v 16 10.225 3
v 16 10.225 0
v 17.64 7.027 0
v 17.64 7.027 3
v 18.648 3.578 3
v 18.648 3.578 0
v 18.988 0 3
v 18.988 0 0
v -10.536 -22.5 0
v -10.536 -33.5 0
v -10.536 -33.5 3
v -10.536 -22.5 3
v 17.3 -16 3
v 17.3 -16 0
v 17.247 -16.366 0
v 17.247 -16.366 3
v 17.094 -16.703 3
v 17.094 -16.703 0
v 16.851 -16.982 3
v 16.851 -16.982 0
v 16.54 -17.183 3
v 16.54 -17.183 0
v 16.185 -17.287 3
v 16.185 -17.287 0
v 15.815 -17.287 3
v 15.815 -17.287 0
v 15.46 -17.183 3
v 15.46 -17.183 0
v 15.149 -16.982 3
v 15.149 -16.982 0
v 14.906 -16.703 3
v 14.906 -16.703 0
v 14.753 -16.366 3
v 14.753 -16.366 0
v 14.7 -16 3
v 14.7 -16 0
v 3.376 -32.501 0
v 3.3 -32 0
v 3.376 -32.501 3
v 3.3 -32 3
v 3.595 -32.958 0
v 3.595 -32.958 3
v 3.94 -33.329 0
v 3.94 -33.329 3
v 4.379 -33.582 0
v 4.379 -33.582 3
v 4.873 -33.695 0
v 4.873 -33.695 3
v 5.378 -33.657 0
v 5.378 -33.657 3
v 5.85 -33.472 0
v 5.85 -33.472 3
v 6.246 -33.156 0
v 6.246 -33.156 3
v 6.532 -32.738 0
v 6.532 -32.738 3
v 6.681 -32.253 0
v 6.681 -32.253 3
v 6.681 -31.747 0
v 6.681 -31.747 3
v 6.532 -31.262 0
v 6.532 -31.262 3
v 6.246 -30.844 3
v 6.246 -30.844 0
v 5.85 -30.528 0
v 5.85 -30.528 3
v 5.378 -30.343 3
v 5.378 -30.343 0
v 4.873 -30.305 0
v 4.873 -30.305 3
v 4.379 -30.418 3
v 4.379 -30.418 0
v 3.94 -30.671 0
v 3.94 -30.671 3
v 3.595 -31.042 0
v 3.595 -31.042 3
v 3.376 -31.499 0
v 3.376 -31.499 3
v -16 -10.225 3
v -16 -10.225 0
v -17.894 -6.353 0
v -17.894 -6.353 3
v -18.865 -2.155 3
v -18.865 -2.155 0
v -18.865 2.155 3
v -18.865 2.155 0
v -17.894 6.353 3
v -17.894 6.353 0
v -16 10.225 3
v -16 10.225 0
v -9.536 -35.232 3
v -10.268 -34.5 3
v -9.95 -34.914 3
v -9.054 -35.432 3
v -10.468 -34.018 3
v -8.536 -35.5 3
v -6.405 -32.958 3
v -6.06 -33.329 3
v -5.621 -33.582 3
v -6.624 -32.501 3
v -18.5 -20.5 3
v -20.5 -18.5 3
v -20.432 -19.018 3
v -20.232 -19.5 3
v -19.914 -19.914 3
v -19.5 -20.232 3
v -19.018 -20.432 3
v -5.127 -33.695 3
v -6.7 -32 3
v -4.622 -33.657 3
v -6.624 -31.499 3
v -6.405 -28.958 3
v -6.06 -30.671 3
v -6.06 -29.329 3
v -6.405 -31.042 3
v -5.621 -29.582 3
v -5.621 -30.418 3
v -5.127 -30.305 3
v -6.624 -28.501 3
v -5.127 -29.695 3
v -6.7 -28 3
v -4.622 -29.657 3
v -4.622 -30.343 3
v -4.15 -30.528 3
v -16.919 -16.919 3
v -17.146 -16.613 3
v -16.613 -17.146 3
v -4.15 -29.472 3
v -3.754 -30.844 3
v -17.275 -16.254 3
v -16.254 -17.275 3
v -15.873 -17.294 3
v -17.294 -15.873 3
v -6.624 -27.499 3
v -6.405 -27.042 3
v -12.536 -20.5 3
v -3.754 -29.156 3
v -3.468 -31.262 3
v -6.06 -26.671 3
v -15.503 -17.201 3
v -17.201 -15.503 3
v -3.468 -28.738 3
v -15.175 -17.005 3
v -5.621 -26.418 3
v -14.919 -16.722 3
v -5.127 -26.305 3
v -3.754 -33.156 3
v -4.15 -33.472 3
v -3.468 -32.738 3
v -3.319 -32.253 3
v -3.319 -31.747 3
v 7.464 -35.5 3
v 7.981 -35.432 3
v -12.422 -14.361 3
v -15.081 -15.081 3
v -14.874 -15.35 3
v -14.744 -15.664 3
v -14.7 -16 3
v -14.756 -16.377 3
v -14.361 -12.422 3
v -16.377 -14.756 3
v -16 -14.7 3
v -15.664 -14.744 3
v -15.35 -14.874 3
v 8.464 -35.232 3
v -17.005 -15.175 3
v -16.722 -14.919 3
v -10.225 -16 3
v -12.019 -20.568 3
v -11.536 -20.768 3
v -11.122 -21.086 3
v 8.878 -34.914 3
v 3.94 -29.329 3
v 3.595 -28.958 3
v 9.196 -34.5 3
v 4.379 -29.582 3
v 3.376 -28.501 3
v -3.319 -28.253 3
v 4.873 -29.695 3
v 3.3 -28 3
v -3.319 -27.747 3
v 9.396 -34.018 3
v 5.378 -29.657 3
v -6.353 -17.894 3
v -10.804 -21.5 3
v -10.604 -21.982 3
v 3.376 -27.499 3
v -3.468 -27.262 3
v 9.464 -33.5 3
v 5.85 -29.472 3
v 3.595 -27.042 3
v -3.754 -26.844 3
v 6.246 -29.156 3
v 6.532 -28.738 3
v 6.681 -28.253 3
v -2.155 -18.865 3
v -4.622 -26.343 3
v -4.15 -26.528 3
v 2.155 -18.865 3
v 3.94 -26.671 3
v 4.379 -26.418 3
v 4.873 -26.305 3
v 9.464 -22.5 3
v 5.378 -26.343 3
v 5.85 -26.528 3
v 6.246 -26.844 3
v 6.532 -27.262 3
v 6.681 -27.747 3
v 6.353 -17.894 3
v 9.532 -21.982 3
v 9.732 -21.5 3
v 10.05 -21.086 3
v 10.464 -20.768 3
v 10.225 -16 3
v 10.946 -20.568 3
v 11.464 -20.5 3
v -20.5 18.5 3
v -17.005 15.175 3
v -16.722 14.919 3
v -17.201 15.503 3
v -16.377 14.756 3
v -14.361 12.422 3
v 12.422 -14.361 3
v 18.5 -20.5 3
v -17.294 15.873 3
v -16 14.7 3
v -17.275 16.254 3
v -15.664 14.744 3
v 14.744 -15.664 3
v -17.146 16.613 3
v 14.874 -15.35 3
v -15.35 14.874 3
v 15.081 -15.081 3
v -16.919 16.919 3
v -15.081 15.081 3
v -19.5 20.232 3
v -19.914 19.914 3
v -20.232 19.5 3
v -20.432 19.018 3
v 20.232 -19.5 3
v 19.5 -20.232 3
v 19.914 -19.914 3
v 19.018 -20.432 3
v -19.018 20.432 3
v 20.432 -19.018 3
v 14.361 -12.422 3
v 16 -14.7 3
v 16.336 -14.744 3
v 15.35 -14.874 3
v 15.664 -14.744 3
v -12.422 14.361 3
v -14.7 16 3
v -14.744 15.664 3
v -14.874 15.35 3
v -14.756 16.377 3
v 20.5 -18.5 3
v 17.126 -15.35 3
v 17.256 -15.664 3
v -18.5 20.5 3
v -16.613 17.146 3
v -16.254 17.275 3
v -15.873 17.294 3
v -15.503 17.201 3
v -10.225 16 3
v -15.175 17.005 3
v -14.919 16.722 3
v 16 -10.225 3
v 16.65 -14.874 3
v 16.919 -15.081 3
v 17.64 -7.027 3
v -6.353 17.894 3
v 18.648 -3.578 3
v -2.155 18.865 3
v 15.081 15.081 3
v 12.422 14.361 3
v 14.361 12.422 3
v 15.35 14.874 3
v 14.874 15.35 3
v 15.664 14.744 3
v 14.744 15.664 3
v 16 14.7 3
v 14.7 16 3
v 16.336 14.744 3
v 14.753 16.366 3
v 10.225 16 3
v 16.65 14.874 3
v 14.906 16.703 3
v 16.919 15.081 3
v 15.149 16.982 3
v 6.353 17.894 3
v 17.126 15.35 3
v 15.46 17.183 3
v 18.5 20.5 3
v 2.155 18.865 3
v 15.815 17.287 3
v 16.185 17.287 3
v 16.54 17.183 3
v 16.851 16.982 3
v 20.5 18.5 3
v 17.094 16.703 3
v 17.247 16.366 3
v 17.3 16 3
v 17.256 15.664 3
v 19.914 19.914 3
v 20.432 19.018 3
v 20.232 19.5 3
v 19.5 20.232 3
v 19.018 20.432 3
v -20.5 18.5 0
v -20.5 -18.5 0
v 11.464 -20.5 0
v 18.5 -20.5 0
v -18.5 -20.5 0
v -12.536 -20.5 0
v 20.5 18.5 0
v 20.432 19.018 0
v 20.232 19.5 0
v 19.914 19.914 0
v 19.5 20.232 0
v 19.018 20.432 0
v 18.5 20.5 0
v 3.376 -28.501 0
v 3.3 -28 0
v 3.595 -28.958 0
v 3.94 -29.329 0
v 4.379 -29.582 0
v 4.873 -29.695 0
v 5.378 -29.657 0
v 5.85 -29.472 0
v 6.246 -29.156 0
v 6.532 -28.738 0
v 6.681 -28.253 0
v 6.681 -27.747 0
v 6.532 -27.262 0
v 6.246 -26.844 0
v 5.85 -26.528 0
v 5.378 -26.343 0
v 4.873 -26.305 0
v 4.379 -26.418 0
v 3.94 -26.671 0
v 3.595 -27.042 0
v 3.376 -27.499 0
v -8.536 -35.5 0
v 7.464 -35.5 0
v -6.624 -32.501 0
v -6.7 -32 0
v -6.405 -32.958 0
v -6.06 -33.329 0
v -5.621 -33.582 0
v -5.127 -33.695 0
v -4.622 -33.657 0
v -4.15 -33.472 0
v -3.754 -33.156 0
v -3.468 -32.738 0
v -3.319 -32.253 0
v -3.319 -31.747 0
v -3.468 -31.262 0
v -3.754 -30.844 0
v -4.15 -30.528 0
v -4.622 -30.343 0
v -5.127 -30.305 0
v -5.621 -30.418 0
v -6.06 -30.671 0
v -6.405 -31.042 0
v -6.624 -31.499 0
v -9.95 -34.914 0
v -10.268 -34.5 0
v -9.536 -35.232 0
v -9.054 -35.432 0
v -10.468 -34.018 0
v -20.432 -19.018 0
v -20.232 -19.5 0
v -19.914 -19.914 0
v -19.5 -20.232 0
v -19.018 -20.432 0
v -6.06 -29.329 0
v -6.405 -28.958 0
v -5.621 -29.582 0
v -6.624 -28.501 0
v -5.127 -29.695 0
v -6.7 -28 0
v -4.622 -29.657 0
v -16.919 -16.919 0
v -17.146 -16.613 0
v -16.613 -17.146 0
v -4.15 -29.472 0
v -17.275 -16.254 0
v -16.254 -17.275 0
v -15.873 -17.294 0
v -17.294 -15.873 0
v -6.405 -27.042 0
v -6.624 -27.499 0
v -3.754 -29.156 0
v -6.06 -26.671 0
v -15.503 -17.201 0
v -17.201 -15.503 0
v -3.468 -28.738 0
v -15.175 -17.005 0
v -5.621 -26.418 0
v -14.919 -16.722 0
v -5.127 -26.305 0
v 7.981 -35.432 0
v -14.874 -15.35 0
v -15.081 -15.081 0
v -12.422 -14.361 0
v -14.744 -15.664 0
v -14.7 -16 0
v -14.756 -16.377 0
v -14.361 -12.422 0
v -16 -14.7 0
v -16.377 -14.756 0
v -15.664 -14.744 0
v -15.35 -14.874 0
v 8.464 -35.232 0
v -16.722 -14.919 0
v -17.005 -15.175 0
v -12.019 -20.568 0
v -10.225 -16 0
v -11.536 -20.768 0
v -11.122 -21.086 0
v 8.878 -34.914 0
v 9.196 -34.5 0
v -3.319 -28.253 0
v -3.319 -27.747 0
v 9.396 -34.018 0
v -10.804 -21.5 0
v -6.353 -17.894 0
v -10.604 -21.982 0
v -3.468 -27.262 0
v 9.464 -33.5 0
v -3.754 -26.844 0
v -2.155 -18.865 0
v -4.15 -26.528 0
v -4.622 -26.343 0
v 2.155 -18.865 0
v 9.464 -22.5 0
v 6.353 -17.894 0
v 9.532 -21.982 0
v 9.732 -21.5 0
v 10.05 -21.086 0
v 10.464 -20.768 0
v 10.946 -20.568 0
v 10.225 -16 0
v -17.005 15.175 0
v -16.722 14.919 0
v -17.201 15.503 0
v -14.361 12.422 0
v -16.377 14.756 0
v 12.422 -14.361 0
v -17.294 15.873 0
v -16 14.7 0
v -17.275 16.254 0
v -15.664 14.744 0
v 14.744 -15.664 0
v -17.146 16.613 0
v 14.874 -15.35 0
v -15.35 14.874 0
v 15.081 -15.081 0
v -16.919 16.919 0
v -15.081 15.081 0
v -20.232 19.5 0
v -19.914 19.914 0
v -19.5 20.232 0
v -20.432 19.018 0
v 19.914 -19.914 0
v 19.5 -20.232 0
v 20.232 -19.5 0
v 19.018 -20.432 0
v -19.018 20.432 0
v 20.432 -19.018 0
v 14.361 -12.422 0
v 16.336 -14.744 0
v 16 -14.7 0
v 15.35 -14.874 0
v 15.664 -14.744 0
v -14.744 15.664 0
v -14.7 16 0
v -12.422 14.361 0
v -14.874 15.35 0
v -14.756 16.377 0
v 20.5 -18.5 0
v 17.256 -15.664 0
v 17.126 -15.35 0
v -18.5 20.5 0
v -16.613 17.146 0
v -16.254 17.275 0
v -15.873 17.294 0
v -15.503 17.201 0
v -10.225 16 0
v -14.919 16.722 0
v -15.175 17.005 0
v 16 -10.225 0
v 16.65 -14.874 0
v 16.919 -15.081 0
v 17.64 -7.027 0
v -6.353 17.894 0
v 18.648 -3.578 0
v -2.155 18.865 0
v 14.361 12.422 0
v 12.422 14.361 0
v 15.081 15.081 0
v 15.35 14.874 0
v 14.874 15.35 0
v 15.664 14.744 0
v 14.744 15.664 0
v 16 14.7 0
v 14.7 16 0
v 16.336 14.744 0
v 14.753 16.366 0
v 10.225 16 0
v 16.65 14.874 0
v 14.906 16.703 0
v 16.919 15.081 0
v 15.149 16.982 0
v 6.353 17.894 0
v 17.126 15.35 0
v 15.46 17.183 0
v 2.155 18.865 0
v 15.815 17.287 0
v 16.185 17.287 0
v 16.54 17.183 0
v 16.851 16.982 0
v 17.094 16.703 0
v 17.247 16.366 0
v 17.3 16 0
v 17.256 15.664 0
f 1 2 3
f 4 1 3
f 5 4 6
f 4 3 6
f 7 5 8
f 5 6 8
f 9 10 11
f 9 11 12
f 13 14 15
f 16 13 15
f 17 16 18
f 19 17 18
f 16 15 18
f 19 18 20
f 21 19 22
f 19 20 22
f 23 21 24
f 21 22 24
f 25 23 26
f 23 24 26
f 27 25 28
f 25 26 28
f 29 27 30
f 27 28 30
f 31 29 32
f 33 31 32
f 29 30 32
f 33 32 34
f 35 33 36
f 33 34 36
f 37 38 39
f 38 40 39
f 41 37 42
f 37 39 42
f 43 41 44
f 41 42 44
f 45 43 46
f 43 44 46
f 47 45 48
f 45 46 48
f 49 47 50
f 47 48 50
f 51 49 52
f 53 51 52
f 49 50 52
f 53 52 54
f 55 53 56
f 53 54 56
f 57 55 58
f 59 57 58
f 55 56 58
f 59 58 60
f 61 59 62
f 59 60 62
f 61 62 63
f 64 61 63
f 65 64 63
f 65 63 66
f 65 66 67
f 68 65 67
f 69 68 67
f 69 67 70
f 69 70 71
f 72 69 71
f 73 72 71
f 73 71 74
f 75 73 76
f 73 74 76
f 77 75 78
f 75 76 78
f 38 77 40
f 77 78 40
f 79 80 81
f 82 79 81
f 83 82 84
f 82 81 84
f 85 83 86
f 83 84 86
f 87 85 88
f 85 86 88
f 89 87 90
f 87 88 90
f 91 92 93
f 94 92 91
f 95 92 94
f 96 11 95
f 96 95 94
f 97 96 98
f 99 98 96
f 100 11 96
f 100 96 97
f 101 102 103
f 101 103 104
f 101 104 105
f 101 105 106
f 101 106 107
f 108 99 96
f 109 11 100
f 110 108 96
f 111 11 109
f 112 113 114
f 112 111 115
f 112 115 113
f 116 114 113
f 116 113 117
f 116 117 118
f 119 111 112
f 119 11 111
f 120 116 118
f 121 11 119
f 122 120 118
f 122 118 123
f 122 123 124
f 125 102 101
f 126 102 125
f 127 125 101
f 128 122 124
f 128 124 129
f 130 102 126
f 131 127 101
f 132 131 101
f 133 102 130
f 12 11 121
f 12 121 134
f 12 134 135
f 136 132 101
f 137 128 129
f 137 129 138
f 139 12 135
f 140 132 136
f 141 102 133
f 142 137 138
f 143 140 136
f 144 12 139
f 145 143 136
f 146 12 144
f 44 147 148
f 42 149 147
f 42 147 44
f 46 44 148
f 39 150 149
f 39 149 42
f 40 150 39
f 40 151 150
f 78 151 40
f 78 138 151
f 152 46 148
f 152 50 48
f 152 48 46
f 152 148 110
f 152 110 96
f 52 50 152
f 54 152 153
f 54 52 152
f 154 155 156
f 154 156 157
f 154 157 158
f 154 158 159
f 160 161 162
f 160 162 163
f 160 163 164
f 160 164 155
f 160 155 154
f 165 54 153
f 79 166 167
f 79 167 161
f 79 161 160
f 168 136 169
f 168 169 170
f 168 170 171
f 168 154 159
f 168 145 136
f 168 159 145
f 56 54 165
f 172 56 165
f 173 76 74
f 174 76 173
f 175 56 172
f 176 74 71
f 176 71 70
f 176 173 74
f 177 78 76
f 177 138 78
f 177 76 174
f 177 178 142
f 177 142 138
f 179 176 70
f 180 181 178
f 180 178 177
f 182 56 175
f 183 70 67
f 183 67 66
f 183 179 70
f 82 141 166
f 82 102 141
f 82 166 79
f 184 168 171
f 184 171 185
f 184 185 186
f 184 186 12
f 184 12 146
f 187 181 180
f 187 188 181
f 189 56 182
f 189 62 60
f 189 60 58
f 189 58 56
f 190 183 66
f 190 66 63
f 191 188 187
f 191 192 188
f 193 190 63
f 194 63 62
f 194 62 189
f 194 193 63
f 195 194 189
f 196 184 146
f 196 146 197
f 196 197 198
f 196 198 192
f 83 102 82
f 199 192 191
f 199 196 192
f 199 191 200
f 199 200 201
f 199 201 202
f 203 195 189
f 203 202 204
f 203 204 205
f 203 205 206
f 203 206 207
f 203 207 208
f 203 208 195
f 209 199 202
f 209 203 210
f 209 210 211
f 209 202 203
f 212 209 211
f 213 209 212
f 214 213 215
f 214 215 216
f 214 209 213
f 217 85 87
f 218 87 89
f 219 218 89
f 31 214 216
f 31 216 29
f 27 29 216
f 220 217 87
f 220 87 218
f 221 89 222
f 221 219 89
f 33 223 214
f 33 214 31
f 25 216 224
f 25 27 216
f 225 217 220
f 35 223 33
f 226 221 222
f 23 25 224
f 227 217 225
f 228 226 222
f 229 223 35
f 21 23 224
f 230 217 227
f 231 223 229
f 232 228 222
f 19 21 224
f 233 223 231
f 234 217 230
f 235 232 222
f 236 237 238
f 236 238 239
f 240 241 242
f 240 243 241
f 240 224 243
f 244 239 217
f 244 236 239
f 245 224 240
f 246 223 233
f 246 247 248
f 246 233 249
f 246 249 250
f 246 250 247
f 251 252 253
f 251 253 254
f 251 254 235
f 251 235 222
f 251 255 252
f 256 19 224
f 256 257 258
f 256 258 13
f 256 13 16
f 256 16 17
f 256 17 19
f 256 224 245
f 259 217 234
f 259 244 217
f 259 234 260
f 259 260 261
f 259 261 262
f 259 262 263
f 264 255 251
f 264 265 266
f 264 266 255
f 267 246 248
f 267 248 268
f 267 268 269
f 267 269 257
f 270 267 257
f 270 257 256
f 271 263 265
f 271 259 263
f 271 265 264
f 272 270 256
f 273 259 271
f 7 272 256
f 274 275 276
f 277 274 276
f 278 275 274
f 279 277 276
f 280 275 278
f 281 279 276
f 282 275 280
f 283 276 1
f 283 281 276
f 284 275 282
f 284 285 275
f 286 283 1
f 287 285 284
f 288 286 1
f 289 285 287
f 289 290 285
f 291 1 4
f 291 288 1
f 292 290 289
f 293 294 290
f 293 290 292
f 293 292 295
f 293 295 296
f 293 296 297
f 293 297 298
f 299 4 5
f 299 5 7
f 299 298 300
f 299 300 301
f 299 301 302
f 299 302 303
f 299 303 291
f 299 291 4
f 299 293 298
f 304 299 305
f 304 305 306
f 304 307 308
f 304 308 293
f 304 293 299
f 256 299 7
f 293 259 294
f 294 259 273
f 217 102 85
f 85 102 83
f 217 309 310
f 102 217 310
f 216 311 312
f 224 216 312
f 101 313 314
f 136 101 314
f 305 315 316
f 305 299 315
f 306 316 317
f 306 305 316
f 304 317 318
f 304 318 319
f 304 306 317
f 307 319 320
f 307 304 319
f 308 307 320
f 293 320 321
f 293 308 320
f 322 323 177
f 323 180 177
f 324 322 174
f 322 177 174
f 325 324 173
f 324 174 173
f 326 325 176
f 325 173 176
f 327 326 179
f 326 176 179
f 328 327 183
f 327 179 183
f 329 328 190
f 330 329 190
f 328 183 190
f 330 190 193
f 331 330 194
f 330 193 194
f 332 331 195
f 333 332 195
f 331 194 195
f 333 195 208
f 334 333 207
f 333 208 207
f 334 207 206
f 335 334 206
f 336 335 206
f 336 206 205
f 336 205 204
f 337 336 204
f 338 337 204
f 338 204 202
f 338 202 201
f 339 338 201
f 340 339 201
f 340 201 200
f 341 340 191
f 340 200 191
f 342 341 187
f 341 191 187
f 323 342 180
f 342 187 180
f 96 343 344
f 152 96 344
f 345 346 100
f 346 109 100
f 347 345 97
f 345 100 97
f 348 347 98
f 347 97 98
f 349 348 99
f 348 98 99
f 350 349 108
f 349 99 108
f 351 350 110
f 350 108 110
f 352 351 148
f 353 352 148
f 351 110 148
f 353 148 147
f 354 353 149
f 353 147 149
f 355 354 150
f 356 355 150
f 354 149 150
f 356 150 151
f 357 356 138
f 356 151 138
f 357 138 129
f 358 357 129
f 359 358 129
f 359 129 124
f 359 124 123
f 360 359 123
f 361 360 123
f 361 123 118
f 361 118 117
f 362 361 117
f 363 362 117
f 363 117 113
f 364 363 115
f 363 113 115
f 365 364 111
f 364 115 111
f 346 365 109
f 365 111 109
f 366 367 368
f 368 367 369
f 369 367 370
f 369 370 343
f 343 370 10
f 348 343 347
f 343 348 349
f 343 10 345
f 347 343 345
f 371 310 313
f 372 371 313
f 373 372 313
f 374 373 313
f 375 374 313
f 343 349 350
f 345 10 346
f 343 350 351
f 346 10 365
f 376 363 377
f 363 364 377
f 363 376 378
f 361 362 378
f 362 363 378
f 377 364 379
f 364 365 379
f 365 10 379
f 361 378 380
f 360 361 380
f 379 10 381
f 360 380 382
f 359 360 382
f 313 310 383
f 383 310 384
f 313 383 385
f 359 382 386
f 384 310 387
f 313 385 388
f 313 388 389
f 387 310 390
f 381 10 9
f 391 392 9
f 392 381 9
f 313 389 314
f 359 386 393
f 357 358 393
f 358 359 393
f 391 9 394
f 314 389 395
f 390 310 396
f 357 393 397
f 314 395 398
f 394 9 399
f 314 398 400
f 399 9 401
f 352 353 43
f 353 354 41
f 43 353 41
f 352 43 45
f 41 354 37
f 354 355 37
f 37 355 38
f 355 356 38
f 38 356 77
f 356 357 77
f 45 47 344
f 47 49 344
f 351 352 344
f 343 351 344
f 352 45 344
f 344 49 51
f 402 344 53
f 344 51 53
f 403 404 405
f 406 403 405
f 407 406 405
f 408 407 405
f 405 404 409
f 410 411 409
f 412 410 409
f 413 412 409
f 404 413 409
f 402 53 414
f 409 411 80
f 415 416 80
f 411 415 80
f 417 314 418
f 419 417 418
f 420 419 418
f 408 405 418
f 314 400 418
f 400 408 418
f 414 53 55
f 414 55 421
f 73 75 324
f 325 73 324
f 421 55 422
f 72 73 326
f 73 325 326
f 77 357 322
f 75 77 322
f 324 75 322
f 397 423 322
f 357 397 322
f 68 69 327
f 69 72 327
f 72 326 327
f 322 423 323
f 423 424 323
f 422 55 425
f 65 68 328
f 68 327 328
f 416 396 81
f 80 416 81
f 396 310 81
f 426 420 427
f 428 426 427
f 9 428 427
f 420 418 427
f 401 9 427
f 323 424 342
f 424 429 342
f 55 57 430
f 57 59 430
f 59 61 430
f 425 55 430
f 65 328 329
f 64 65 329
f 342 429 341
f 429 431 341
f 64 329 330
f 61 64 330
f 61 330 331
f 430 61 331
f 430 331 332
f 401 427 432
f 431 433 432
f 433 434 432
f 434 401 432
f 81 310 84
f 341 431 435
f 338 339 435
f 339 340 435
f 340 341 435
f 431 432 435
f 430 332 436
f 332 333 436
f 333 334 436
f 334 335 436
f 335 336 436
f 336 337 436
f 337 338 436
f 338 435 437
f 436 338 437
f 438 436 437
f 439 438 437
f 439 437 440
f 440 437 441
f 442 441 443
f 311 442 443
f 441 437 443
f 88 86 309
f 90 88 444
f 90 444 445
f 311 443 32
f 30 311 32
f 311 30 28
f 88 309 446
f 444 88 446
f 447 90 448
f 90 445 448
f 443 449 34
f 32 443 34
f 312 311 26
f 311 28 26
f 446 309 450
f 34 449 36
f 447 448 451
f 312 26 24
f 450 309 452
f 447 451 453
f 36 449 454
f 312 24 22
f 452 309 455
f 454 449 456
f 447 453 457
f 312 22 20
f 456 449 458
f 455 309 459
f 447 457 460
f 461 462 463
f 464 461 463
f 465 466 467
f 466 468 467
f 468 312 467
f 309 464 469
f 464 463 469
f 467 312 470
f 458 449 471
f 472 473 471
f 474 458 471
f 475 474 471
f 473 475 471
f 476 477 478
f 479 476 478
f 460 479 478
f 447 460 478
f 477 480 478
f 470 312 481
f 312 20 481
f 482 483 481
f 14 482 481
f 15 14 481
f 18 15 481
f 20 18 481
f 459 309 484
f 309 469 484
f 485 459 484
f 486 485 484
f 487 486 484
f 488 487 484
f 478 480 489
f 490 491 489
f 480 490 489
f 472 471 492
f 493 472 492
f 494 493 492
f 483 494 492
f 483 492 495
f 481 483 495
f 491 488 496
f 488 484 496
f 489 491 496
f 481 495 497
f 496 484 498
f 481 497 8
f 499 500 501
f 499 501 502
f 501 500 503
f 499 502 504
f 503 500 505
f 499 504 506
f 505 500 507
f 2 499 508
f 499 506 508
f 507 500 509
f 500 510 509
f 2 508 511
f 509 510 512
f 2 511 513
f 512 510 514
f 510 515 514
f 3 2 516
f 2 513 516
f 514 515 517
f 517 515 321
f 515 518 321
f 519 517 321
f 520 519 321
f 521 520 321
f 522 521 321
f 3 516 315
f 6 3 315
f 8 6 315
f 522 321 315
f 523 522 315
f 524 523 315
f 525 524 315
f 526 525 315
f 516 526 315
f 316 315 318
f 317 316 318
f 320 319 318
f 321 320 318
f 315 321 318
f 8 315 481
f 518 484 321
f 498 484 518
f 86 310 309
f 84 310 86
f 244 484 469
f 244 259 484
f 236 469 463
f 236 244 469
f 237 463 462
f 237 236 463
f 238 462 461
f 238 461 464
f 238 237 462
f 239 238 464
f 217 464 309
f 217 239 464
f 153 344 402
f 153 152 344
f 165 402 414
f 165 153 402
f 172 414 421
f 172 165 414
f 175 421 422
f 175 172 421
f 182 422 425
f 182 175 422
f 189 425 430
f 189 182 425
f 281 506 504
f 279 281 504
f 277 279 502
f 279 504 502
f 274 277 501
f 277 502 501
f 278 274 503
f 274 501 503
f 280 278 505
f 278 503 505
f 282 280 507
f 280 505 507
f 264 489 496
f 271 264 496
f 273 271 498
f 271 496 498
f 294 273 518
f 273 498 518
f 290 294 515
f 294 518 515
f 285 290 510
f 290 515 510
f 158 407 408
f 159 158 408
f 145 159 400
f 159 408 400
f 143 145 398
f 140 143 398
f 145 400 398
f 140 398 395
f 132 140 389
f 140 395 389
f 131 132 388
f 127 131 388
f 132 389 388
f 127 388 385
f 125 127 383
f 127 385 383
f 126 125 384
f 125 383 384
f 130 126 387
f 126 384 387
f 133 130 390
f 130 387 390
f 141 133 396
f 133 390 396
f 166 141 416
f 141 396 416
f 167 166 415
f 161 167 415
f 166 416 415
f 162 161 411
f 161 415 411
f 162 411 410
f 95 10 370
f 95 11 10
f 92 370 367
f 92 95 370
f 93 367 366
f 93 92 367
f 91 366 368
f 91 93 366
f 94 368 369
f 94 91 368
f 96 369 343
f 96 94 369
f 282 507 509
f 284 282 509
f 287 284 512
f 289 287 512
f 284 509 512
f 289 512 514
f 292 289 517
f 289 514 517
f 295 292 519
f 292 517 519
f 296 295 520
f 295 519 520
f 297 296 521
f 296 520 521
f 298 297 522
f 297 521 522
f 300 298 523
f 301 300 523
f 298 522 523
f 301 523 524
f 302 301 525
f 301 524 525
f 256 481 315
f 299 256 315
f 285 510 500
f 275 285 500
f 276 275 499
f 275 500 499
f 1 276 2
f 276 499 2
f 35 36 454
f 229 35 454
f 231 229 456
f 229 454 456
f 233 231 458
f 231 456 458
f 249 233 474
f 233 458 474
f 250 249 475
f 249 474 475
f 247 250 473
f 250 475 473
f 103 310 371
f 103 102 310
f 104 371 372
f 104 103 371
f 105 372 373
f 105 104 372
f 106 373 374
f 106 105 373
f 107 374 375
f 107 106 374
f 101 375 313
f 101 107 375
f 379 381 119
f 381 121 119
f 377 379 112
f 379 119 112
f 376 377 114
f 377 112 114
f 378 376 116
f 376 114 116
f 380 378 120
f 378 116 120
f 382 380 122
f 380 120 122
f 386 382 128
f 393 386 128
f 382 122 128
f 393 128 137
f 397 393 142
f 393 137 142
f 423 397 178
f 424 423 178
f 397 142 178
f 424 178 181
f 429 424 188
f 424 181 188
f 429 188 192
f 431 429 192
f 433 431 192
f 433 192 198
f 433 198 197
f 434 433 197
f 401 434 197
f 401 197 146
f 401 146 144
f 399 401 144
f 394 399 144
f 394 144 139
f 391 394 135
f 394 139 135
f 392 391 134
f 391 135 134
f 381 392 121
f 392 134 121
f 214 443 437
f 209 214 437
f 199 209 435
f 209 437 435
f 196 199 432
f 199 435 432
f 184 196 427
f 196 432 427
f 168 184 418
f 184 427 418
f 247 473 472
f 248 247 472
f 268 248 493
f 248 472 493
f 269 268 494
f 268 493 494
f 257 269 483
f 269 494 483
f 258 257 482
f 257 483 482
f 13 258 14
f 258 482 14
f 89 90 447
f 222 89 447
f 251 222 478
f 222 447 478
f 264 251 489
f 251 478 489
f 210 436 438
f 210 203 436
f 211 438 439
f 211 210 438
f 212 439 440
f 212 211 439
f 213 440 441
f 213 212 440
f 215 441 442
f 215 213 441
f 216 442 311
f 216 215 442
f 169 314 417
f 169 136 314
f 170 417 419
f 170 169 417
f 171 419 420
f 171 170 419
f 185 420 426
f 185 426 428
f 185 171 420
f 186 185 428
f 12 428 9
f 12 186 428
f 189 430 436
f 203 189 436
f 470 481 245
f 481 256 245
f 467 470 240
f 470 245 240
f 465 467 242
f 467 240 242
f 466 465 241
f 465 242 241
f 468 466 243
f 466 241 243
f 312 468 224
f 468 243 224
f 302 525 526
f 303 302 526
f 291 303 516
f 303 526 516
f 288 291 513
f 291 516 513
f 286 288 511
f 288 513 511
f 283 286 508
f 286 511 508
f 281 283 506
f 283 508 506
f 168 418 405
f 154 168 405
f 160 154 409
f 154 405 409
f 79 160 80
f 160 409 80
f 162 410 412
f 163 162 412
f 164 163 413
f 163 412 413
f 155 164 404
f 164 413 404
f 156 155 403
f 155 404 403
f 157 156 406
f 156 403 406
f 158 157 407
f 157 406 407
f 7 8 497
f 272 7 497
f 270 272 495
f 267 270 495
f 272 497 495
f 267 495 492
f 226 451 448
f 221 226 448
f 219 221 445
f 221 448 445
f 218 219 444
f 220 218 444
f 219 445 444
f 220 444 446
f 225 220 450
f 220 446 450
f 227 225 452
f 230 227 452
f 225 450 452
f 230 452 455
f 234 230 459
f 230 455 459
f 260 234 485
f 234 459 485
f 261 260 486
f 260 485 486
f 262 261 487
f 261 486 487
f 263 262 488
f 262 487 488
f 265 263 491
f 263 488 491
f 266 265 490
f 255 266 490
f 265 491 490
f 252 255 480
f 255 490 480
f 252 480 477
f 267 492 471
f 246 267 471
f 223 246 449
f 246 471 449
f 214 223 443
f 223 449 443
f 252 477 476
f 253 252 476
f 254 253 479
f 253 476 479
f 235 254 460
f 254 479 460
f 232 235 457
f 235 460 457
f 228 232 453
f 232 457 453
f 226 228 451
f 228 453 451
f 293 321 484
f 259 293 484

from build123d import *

# Parameters (mm, degrees)
F0_W     = 20
F0_H     = 15
F1_DEPTH = 3
F2_R     = 2
F3_D     = 3.4
F3_DEPTH = 3
F3_TIP   = 1.0214630523


with BuildPart() as f1:
    # F0 (on Top) → F1 (new body)
    with BuildSketch(Plane.XY):
        Polygon((9.4637456983, -20.5), (20.5, -20.5), (20.5, 20.5), (-20.5, 20.5), (-20.5, -20.5), (-10.5362543017, -20.5), align=None)
        with BuildLine():
            Line((-10.2246830758, -16), (-14.7, -16))
            ThreePointArc((-14.7, -16), (-16.9192388155, -16.9192388155), (-16, -14.7))
            Line((-16, -14.7), (-16, -10.2246830758))
            ThreePointArc((-16, -10.2246830758), (-18.988, 0), (-16, 10.2246830758))
            Line((-16, 10.2246830758), (-16, 14.7))
            ThreePointArc((-16, 14.7), (-16.9192388155, 16.9192388155), (-14.7, 16))
            Line((-14.7, 16), (-10.2246830758, 16))
            ThreePointArc((-10.2246830758, 16), (0, 18.988), (10.2246830758, 16))
            Line((10.2246830758, 16), (14.7, 16))
            ThreePointArc((14.7, 16), (16, 17.3), (17.3, 16))
            ThreePointArc((17.3, 16), (16.9192388155, 15.0807611845), (16, 14.7))
            Line((16, 14.7), (16, 10.2246830758))
            ThreePointArc((16, 10.2246830758), (18.2256981211, 5.3261686042), (18.988, 0))
            ThreePointArc((18.988, 0), (18.2256981211, -5.3261686042), (16, -10.2246830758))
            Line((16, -10.2246830758), (16, -14.7))
            ThreePointArc((16, -14.7), (16.9192388155, -15.0807611845), (17.3, -16))
            ThreePointArc((17.3, -16), (16, -17.3), (14.7, -16))
            Line((14.7, -16), (10.2246830758, -16))
            ThreePointArc((10.2246830758, -16), (0, -18.988), (-10.2246830758, -16))
        make_face(mode=Mode.SUBTRACT)
        with BuildLine():
            Line((-16, 14.7), (-16, 10.2246830758))
            ThreePointArc((-16, 10.2246830758), (-13.4265435612, 13.4265435612), (-10.2246830758, 16))
            Line((-10.2246830758, 16), (-14.7, 16))
            ThreePointArc((-14.7, 16), (-15.0807611845, 15.0807611845), (-16, 14.7))
        make_face()
        with BuildLine():
            ThreePointArc((10.2246830758, 16), (13.4265435612, 13.4265435612), (16, 10.2246830758))
            Line((16, 10.2246830758), (16, 14.7))
            ThreePointArc((16, 14.7), (15.0807611845, 15.0807611845), (14.7, 16))
            Line((14.7, 16), (10.2246830758, 16))
        make_face()
        with BuildLine():
            ThreePointArc((16, -10.2246830758), (13.4265435612, -13.4265435612), (10.2246830758, -16))
            Line((10.2246830758, -16), (14.7, -16))
            ThreePointArc((14.7, -16), (15.0807611845, -15.0807611845), (16, -14.7))
            Line((16, -14.7), (16, -10.2246830758))
        make_face()
        with BuildLine():
            ThreePointArc((-16, -14.7), (-15.0807611845, -15.0807611845), (-14.7, -16))
            Line((-14.7, -16), (-10.2246830758, -16))
            ThreePointArc((-10.2246830758, -16), (-13.4265435612, -13.4265435612), (-16, -10.2246830758))
            Line((-16, -10.2246830758), (-16, -14.7))
        make_face()
        with Locations((-0.5362543017, -28)):
            Rectangle(F0_W, F0_H)
    extrude(amount=F1_DEPTH)

    # F2
    f2_edges = [f1.edges().sort_by_distance(p)[0] for p in [
        (20.5, -20.5, 1.5),
        (20.5, 20.5, 1.5),
        (-20.5, 20.5, 1.5),
        (-20.5, -20.5, 1.5),
        (-10.536254, -35.5, 1.5),
        (9.463746, -35.5, 1.5),
        (-10.536254, -20.5, 1.5),
        (9.463746, -20.5, 1.5),
    ]]
    fillet(f2_edges, radius=F2_R)

    # F3
    with Locations(Plane(origin=(0, 0, 0), x_dir=(1, 0, 0), z_dir=(0, 0, -1))):
        with Locations((-5, 28), (5, 28), (-5, 32), (5, 32)):
            Hole(F3_D / 2, depth=F3_DEPTH)
            with Locations((0, 0, -(F3_DEPTH + F3_TIP / 2))):  # 118° drill point
                Cone(0, F3_D / 2, F3_TIP, mode=Mode.SUBTRACT)


solid = f1.part
